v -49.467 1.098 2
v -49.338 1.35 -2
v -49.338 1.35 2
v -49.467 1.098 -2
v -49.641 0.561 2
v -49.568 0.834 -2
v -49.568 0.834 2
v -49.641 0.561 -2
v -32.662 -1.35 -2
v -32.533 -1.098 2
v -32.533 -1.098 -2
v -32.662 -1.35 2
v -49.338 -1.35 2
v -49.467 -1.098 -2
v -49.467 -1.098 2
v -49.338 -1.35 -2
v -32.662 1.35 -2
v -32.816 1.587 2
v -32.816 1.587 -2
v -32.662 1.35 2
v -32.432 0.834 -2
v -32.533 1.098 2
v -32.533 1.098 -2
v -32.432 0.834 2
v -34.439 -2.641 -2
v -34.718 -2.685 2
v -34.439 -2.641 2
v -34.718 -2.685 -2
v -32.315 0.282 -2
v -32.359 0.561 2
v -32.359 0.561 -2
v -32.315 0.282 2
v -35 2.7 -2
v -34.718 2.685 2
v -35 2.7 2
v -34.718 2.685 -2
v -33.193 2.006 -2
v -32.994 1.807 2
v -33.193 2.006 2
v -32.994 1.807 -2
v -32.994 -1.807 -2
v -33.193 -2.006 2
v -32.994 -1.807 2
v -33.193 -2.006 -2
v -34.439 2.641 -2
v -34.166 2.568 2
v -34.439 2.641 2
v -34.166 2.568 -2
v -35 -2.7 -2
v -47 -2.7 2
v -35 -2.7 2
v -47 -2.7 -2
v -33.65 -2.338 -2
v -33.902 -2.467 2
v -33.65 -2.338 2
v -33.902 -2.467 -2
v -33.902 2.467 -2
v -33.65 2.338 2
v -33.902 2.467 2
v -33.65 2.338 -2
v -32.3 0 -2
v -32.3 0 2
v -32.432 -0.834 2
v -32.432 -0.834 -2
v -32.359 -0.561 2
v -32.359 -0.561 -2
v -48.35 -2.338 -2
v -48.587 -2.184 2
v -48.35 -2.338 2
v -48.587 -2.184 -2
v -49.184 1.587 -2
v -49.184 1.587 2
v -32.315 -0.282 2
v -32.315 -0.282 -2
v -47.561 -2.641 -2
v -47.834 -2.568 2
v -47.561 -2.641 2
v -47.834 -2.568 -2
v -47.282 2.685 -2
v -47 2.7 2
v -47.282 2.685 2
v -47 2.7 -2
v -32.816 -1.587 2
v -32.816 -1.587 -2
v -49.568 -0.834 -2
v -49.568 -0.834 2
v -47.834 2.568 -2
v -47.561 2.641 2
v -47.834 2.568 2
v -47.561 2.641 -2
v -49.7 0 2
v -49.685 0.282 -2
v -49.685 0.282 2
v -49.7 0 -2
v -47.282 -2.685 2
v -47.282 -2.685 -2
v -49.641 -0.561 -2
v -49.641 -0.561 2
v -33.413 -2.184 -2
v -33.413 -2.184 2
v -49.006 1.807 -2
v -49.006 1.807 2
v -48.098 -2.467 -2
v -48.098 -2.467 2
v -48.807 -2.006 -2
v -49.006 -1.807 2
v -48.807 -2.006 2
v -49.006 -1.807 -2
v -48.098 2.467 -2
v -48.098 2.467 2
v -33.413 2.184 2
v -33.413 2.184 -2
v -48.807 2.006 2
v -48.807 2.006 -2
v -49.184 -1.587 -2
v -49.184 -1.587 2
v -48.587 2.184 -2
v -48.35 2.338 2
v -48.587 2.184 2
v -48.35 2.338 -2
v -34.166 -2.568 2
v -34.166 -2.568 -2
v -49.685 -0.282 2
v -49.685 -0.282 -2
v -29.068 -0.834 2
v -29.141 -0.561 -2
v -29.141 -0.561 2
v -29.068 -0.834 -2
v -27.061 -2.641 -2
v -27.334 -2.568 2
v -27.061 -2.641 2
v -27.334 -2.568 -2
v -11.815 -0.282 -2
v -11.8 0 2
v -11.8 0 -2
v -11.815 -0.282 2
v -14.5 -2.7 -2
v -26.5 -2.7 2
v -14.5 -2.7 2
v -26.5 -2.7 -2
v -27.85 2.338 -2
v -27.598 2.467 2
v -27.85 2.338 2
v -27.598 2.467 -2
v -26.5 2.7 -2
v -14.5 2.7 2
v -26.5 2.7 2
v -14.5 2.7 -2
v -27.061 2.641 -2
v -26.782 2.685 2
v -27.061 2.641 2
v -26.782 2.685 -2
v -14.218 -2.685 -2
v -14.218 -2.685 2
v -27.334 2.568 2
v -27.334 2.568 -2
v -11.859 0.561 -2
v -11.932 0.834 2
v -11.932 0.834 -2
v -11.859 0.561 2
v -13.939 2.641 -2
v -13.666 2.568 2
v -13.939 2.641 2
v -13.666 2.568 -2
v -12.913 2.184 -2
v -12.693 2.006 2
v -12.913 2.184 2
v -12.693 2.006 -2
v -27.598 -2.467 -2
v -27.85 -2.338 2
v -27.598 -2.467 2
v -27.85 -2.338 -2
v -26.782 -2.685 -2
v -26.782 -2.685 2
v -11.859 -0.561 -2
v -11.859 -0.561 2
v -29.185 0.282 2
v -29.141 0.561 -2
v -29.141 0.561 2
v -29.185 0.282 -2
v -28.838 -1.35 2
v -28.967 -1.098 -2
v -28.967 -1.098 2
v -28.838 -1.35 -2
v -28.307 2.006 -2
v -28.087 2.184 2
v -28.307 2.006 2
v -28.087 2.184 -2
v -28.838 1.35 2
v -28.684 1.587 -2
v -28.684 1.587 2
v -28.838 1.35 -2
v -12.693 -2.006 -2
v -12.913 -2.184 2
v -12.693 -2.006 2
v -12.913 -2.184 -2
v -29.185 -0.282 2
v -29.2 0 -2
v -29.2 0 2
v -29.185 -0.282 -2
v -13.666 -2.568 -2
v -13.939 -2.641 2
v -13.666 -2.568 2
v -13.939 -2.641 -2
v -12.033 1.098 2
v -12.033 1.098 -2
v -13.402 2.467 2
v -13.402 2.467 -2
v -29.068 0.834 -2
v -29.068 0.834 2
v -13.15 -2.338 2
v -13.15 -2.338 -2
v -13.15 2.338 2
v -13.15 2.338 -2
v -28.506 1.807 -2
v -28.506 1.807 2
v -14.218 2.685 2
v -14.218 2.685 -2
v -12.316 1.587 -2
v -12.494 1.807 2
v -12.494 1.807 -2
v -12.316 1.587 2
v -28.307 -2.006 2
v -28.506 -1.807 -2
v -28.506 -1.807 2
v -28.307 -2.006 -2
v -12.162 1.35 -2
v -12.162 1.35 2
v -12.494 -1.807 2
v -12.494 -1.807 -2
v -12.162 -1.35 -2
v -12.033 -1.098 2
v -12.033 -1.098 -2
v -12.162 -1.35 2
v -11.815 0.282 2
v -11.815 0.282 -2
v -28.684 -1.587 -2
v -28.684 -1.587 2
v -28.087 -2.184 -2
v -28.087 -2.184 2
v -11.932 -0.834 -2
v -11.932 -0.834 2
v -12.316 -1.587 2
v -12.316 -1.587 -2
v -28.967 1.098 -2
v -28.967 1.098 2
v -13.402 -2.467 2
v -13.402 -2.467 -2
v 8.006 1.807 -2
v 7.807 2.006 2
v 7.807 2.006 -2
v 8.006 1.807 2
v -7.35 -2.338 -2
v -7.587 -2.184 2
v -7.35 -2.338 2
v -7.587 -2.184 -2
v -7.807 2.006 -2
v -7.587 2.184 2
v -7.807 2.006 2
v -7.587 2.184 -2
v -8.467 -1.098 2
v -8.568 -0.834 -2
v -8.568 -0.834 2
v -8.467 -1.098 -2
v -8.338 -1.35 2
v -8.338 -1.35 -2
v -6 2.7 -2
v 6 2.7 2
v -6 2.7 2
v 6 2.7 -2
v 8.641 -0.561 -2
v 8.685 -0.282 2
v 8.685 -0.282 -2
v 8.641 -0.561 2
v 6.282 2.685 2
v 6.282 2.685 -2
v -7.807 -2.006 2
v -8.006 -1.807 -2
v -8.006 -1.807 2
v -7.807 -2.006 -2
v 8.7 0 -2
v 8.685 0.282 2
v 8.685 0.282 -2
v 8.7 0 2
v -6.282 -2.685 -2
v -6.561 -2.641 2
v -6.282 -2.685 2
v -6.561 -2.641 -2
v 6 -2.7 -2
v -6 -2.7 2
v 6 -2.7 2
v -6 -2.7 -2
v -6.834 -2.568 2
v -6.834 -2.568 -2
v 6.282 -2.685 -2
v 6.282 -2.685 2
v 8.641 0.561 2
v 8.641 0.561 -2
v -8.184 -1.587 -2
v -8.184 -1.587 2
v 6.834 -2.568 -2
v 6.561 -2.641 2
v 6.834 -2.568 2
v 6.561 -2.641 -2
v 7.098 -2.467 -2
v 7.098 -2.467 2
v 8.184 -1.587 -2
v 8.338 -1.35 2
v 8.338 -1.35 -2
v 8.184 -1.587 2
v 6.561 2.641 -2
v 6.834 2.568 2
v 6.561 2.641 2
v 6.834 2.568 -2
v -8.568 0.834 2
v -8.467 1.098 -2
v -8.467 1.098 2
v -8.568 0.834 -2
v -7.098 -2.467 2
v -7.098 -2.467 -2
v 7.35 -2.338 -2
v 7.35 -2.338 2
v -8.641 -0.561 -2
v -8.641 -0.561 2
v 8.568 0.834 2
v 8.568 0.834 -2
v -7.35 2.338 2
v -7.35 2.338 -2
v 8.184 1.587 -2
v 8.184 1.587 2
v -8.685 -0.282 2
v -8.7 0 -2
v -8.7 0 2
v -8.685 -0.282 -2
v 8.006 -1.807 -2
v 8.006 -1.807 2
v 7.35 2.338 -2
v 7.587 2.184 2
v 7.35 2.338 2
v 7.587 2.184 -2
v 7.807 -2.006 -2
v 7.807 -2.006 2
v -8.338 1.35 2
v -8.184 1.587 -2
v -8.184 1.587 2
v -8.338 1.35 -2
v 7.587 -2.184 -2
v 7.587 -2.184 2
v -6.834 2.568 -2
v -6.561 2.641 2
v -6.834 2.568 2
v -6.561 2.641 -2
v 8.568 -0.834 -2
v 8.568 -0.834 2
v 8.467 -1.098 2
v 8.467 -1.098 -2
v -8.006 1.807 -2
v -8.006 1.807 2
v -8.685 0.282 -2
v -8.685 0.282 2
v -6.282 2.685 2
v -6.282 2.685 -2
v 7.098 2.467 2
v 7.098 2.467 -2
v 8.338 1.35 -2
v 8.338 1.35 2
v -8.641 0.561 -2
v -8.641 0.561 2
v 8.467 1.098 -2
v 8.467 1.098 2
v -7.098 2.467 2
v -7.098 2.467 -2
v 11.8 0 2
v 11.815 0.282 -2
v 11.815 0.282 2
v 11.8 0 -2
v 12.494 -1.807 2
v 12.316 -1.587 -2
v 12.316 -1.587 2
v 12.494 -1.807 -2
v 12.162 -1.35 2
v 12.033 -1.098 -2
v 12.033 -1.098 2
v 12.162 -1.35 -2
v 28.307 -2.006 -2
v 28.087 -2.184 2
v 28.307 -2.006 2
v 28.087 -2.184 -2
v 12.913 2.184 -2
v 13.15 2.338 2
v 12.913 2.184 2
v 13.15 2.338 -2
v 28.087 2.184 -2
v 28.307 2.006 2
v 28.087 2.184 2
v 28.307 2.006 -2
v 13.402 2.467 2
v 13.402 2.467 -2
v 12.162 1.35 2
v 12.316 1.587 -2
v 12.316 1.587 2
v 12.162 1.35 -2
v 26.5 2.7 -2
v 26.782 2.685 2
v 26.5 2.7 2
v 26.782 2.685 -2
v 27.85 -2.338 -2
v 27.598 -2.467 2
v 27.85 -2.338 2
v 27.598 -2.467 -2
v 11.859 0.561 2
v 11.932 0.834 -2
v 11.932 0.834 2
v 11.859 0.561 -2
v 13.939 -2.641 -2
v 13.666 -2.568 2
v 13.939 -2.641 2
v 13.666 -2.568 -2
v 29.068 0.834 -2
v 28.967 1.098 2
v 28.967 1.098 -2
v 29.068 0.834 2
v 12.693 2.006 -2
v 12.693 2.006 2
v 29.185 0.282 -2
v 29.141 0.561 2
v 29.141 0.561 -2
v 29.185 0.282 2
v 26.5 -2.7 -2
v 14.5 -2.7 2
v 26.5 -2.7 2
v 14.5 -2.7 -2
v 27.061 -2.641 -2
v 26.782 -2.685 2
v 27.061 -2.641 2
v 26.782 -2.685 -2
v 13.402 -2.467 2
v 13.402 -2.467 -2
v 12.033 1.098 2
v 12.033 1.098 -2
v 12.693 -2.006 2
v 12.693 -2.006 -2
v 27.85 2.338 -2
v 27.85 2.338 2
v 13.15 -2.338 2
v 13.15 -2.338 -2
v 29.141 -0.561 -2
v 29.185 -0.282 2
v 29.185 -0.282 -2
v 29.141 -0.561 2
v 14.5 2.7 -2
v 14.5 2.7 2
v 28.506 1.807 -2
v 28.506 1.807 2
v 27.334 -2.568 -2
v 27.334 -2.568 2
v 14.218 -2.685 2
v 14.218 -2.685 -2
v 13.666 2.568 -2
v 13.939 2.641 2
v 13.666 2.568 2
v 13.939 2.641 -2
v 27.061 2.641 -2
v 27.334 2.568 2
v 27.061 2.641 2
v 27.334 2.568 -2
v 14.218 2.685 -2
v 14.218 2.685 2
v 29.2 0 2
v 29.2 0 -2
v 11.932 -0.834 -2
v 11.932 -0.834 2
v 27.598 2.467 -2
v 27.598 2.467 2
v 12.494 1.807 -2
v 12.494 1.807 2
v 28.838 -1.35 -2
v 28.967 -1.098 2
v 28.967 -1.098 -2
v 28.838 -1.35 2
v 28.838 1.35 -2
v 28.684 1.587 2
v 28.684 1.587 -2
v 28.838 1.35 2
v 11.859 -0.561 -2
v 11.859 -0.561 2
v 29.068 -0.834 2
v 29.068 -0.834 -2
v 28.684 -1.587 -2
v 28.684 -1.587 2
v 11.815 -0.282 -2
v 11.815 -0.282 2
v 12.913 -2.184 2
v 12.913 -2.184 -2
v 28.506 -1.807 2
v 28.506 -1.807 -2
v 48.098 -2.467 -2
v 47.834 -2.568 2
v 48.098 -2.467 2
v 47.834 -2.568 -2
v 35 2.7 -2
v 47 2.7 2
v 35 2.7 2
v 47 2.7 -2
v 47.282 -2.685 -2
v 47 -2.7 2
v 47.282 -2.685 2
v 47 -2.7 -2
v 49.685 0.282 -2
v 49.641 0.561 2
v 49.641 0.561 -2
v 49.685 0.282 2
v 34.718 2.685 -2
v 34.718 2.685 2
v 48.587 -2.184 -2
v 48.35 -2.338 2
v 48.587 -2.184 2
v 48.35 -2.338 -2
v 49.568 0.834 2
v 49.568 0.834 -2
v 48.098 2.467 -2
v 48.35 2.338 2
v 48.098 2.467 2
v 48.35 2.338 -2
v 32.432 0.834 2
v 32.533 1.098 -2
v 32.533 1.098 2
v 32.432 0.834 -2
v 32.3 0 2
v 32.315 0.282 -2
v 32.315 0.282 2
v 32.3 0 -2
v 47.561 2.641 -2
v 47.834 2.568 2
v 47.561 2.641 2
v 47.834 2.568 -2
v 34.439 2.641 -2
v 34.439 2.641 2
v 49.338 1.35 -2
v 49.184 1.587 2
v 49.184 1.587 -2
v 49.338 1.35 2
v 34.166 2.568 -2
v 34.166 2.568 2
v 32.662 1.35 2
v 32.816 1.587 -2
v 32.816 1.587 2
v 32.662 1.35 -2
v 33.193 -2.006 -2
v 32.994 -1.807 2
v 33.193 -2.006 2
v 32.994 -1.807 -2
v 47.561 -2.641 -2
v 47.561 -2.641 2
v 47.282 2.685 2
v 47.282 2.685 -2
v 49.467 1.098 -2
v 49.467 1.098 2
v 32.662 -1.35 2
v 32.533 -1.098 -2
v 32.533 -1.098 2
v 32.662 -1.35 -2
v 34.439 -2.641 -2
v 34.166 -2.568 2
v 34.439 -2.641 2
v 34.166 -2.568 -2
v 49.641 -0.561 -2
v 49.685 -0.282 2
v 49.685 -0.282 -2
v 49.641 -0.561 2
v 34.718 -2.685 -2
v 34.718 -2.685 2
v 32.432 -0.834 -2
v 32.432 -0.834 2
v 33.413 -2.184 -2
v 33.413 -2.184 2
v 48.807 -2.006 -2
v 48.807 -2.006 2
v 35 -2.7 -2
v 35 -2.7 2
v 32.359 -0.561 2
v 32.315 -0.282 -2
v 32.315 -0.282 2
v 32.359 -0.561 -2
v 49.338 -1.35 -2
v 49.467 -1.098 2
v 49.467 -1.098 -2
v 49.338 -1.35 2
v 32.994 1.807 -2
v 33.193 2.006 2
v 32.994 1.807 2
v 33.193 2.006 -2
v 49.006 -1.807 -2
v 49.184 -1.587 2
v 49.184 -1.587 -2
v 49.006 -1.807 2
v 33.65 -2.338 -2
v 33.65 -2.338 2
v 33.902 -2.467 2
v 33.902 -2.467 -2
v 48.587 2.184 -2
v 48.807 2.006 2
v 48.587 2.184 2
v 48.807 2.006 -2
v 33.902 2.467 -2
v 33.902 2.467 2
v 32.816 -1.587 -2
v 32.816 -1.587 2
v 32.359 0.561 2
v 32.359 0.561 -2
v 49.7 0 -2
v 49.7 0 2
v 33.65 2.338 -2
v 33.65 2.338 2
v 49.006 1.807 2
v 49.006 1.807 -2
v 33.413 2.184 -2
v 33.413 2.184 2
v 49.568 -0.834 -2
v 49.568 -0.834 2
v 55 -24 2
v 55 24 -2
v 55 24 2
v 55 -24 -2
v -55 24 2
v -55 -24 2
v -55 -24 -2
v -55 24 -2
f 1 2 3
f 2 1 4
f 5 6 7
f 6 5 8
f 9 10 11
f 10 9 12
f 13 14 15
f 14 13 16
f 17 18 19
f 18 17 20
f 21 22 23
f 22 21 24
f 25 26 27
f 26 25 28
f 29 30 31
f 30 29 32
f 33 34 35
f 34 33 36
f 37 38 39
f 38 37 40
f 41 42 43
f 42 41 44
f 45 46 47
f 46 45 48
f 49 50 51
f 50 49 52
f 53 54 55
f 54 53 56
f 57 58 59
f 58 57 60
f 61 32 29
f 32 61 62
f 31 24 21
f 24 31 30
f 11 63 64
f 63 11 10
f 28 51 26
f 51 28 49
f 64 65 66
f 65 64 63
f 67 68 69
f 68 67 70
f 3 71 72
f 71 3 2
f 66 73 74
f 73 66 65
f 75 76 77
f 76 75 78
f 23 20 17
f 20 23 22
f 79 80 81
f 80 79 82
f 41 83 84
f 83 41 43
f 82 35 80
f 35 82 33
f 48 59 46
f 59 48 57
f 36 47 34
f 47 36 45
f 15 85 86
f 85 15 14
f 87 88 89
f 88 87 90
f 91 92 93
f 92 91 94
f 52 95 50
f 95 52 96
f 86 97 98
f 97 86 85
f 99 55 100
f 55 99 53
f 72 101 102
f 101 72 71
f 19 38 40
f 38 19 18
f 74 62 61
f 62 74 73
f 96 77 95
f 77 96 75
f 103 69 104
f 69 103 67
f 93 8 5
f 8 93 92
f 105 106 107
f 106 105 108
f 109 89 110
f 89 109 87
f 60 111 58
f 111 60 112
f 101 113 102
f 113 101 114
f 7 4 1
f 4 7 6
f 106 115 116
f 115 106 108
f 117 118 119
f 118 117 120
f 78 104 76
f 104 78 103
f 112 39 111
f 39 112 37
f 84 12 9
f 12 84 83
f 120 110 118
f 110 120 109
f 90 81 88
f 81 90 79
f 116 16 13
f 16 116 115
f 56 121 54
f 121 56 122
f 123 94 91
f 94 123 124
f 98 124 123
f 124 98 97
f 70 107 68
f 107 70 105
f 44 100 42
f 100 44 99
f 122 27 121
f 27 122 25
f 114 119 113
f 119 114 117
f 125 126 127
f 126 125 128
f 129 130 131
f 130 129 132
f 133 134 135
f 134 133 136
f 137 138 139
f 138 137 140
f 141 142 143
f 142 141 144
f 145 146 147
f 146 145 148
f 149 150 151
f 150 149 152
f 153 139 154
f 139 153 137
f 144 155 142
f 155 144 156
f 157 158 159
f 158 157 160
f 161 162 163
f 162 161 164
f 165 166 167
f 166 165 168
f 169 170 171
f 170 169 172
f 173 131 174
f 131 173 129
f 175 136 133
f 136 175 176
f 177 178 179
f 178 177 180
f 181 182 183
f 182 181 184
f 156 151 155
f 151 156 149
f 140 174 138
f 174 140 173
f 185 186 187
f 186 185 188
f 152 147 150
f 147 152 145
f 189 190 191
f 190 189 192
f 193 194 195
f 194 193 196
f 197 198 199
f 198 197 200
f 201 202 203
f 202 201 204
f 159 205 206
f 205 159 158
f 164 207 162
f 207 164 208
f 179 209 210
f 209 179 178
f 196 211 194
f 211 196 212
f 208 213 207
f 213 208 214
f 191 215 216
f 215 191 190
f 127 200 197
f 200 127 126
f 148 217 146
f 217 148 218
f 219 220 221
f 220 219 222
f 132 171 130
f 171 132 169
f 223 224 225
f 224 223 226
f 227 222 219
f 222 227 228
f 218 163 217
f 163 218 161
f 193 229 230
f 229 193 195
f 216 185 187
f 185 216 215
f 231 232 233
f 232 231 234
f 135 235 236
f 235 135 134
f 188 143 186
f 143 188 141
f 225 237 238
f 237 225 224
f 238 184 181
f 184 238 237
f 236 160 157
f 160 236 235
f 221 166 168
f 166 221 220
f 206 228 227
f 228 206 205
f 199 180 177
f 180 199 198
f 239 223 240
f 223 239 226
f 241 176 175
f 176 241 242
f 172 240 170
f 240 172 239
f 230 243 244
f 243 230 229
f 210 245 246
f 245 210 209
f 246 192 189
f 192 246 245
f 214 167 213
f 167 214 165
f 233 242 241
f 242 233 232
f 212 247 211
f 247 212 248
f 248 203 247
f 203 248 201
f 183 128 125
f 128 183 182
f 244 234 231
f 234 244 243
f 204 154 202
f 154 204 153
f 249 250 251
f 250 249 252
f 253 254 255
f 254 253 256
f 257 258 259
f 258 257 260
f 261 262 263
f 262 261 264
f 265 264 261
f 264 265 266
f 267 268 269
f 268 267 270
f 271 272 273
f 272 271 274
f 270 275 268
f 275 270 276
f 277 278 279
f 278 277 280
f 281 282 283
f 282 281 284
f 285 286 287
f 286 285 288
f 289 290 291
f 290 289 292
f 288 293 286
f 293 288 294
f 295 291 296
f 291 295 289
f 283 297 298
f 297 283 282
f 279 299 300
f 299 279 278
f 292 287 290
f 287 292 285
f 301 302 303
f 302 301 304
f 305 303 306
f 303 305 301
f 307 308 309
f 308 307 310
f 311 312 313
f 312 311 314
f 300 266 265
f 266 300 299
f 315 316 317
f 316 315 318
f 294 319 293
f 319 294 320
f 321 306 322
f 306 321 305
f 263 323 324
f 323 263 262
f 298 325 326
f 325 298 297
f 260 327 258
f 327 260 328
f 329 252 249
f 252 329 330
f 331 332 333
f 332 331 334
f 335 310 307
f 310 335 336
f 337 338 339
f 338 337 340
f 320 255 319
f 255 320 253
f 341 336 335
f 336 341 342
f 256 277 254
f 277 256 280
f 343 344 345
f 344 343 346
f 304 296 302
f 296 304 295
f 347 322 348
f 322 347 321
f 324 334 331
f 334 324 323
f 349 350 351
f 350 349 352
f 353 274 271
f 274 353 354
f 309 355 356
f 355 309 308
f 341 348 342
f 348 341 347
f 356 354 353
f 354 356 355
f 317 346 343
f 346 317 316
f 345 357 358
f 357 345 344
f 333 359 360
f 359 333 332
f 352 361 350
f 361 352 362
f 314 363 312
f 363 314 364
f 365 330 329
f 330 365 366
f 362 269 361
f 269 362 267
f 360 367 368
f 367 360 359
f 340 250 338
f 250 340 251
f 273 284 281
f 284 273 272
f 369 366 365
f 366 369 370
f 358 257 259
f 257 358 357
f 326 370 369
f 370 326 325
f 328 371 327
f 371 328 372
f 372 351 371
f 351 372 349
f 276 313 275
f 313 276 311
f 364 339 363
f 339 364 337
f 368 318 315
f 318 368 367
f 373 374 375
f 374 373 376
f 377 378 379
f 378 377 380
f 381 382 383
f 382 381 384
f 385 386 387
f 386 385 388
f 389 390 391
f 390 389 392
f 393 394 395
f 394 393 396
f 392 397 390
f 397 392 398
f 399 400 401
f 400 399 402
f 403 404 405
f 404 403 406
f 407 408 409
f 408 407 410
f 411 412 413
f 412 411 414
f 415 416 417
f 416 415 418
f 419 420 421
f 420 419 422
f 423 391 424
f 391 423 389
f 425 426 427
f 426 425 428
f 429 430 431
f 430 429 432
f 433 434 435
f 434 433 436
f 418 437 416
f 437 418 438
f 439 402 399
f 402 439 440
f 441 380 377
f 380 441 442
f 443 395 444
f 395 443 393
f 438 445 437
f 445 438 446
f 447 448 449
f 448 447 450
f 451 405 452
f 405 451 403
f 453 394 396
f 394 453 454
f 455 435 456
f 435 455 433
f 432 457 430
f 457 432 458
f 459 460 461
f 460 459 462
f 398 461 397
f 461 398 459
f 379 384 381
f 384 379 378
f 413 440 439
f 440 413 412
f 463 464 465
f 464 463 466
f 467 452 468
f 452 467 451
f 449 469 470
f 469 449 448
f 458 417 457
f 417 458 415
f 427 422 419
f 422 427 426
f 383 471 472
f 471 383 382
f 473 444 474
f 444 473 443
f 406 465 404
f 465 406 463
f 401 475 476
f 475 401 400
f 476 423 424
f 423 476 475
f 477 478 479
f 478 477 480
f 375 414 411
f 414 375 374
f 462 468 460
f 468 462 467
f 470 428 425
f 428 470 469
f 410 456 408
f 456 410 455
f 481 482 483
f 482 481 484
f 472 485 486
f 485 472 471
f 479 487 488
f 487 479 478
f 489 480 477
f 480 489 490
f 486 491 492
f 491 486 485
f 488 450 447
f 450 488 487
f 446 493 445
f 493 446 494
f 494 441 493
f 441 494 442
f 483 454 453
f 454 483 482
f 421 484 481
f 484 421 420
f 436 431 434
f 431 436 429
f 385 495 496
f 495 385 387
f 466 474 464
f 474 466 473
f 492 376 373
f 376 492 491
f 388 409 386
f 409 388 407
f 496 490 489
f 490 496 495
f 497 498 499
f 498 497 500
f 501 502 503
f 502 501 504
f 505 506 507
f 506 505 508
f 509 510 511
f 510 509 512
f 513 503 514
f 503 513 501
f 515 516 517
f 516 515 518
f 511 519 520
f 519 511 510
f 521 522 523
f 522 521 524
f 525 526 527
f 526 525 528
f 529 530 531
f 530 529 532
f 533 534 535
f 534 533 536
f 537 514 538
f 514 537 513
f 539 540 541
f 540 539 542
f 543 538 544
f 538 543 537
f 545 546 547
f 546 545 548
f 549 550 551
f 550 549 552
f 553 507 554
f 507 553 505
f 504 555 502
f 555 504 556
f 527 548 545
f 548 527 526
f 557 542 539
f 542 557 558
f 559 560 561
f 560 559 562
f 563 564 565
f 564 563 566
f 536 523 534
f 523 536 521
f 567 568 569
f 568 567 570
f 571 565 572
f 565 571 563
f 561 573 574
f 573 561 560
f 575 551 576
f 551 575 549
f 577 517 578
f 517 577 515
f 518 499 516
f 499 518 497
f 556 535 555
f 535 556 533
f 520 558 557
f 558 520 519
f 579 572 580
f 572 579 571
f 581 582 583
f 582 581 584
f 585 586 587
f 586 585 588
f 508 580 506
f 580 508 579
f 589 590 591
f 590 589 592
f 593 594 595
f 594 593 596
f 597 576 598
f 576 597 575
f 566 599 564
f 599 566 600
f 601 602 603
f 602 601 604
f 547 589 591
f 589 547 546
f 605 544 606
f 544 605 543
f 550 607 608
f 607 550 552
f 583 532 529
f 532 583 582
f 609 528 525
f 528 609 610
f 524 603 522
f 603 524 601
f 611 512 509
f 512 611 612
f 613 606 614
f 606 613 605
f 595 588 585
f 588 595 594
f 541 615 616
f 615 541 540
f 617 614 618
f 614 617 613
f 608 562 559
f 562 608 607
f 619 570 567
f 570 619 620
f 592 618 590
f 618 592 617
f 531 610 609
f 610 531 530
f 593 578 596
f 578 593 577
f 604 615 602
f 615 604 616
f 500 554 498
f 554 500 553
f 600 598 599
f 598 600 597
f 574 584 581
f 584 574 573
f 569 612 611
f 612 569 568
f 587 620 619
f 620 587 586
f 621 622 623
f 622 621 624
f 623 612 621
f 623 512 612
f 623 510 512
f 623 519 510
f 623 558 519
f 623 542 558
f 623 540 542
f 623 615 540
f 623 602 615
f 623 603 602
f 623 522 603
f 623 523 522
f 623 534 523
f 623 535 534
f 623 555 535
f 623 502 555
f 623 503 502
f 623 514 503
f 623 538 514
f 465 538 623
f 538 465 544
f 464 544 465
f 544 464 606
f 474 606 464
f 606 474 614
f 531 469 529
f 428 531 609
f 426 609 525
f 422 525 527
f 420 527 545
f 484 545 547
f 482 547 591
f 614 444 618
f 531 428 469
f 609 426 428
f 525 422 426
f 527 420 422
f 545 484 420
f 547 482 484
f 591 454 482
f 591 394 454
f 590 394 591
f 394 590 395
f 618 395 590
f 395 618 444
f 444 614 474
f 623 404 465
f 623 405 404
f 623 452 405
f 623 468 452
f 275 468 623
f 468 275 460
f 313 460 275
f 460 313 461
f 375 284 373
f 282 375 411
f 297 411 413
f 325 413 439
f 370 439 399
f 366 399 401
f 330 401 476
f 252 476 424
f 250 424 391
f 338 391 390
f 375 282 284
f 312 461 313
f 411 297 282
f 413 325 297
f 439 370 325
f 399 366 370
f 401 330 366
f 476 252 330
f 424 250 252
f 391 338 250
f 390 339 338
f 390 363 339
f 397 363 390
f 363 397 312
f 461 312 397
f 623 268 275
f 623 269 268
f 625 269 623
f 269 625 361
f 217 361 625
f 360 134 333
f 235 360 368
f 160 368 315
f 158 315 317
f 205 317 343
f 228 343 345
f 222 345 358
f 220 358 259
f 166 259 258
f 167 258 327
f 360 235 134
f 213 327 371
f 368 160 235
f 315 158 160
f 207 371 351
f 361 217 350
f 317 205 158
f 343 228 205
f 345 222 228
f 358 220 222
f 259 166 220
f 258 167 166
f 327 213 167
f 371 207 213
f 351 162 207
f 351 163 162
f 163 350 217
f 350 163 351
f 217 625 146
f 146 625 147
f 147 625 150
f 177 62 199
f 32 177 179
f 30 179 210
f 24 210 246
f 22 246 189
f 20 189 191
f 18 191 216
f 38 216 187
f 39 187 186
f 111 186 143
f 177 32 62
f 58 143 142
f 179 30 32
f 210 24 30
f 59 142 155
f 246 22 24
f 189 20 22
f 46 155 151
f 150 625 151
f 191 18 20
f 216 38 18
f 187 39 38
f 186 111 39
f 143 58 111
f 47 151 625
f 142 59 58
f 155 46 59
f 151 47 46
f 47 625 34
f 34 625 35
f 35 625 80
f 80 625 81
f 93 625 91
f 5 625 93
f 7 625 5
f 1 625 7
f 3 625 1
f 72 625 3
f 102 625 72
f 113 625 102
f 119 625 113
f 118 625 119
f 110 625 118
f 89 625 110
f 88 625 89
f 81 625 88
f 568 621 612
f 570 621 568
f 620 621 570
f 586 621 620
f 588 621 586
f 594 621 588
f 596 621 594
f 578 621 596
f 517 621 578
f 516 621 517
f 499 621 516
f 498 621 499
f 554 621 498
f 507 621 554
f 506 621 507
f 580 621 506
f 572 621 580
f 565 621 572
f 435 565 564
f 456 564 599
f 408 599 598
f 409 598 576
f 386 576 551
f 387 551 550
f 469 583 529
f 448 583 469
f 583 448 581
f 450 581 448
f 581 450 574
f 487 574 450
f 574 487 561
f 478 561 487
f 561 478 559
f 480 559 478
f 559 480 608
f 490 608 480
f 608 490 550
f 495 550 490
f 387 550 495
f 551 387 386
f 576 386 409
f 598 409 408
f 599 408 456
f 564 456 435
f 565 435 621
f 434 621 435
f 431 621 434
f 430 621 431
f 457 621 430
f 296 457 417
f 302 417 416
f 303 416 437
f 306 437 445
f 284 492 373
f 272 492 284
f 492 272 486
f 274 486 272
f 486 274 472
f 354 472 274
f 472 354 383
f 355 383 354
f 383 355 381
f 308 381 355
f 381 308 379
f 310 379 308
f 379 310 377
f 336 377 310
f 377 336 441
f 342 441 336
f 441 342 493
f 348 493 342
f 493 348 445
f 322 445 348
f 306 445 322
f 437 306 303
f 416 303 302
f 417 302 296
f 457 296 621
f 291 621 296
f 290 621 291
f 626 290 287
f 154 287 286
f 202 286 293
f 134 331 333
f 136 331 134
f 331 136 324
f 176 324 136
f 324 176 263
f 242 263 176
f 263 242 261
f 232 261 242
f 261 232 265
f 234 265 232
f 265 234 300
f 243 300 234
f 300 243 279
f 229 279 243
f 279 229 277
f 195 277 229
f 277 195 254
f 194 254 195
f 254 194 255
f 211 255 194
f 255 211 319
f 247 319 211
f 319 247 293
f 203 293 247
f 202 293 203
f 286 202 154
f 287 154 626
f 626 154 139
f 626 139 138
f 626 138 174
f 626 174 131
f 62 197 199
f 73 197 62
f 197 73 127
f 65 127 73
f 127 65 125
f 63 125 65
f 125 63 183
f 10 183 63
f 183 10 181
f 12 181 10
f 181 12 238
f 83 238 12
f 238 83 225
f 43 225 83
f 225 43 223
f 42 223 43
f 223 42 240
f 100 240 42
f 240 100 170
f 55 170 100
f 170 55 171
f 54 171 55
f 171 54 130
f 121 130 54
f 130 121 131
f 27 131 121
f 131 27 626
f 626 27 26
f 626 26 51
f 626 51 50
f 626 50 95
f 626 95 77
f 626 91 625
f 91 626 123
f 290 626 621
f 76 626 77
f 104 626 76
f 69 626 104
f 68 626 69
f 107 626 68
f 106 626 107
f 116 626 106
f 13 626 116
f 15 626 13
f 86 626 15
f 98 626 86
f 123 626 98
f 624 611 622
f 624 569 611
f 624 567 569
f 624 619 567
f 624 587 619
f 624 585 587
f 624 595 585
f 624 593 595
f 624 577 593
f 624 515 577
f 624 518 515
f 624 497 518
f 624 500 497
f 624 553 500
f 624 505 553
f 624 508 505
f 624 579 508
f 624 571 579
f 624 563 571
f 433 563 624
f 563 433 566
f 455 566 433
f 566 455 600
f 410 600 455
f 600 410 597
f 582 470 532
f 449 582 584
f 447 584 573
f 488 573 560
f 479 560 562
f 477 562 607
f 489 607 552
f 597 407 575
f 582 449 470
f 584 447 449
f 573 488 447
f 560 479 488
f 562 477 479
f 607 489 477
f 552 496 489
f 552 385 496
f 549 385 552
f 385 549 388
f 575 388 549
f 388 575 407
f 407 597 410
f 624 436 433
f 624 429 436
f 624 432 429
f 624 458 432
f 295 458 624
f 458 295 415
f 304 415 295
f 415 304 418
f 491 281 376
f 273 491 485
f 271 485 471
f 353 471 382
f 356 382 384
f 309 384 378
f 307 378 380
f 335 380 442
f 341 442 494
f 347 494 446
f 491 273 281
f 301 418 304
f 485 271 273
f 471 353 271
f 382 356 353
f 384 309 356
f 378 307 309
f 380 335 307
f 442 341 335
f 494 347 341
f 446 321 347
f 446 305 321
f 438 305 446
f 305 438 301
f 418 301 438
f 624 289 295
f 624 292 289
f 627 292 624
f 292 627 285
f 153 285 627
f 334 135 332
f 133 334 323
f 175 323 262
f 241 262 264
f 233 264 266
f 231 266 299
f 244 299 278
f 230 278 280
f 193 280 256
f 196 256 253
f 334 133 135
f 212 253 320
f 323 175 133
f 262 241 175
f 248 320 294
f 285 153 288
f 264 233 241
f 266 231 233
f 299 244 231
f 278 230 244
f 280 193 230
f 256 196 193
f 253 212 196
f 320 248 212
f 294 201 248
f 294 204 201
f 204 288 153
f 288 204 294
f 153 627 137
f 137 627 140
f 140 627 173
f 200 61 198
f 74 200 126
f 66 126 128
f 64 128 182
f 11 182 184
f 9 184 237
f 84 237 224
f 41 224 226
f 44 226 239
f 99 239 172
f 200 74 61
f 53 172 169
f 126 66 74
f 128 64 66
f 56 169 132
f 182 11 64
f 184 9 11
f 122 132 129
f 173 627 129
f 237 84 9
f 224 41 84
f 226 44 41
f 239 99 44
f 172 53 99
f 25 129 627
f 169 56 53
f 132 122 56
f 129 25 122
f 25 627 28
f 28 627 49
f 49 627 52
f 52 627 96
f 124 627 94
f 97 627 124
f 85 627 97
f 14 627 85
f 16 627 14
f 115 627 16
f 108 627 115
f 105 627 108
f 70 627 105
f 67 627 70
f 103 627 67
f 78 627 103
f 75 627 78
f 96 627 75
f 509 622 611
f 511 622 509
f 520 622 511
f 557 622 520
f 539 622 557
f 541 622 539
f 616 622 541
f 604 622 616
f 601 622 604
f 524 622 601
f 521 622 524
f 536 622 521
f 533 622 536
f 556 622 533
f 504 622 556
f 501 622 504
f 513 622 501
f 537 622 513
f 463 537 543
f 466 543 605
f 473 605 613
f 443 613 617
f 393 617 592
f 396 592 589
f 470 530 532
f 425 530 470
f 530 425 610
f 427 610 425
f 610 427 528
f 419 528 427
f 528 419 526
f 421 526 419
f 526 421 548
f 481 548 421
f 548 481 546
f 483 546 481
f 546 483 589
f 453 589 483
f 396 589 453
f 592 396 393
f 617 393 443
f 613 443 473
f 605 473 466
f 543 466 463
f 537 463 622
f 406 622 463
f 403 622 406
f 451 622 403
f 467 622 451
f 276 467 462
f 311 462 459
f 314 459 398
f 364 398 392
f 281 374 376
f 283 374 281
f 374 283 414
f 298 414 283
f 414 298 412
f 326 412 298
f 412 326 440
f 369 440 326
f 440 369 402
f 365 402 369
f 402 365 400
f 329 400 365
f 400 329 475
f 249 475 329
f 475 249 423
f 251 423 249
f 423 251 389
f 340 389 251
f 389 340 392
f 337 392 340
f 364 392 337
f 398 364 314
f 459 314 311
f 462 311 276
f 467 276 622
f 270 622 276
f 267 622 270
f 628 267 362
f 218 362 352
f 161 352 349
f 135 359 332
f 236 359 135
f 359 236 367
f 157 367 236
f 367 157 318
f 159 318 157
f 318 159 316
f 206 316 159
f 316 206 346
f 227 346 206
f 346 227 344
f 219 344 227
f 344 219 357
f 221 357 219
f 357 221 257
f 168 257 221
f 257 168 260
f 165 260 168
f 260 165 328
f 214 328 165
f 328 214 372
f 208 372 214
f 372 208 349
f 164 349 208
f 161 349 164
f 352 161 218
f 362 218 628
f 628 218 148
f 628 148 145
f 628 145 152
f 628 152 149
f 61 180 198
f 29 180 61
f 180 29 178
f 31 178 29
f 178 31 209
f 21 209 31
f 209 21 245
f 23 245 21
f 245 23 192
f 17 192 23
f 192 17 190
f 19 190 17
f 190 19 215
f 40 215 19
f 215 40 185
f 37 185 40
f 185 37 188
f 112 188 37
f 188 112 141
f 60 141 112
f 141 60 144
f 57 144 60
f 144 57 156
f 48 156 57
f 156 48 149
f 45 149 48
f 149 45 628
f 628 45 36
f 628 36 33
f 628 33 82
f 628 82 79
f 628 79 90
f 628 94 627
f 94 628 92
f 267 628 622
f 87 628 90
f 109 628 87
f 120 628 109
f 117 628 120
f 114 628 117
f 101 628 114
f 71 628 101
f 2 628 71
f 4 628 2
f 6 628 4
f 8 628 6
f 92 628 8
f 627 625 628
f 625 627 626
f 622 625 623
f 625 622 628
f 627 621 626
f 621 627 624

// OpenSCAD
// Slotted mounting plate.
$fn = 60;
eps = 0.02;
plate_l = 110;
plate_w = 48;
plate_t = 4;
slot_l = 12;
slot_d = 5.4;
module slot(x) { hull() { translate([x-slot_l/2,0,-plate_t/2-eps]) cylinder(d=slot_d,h=plate_t+2*eps); translate([x+slot_l/2,0,-plate_t/2-eps]) cylinder(d=slot_d,h=plate_t+2*eps); } }
difference() { cube([plate_l, plate_w, plate_t], center=true); for (i=[0:4]) slot(-plate_l/2+14+i*(plate_l-28)/max(1,4)); }
